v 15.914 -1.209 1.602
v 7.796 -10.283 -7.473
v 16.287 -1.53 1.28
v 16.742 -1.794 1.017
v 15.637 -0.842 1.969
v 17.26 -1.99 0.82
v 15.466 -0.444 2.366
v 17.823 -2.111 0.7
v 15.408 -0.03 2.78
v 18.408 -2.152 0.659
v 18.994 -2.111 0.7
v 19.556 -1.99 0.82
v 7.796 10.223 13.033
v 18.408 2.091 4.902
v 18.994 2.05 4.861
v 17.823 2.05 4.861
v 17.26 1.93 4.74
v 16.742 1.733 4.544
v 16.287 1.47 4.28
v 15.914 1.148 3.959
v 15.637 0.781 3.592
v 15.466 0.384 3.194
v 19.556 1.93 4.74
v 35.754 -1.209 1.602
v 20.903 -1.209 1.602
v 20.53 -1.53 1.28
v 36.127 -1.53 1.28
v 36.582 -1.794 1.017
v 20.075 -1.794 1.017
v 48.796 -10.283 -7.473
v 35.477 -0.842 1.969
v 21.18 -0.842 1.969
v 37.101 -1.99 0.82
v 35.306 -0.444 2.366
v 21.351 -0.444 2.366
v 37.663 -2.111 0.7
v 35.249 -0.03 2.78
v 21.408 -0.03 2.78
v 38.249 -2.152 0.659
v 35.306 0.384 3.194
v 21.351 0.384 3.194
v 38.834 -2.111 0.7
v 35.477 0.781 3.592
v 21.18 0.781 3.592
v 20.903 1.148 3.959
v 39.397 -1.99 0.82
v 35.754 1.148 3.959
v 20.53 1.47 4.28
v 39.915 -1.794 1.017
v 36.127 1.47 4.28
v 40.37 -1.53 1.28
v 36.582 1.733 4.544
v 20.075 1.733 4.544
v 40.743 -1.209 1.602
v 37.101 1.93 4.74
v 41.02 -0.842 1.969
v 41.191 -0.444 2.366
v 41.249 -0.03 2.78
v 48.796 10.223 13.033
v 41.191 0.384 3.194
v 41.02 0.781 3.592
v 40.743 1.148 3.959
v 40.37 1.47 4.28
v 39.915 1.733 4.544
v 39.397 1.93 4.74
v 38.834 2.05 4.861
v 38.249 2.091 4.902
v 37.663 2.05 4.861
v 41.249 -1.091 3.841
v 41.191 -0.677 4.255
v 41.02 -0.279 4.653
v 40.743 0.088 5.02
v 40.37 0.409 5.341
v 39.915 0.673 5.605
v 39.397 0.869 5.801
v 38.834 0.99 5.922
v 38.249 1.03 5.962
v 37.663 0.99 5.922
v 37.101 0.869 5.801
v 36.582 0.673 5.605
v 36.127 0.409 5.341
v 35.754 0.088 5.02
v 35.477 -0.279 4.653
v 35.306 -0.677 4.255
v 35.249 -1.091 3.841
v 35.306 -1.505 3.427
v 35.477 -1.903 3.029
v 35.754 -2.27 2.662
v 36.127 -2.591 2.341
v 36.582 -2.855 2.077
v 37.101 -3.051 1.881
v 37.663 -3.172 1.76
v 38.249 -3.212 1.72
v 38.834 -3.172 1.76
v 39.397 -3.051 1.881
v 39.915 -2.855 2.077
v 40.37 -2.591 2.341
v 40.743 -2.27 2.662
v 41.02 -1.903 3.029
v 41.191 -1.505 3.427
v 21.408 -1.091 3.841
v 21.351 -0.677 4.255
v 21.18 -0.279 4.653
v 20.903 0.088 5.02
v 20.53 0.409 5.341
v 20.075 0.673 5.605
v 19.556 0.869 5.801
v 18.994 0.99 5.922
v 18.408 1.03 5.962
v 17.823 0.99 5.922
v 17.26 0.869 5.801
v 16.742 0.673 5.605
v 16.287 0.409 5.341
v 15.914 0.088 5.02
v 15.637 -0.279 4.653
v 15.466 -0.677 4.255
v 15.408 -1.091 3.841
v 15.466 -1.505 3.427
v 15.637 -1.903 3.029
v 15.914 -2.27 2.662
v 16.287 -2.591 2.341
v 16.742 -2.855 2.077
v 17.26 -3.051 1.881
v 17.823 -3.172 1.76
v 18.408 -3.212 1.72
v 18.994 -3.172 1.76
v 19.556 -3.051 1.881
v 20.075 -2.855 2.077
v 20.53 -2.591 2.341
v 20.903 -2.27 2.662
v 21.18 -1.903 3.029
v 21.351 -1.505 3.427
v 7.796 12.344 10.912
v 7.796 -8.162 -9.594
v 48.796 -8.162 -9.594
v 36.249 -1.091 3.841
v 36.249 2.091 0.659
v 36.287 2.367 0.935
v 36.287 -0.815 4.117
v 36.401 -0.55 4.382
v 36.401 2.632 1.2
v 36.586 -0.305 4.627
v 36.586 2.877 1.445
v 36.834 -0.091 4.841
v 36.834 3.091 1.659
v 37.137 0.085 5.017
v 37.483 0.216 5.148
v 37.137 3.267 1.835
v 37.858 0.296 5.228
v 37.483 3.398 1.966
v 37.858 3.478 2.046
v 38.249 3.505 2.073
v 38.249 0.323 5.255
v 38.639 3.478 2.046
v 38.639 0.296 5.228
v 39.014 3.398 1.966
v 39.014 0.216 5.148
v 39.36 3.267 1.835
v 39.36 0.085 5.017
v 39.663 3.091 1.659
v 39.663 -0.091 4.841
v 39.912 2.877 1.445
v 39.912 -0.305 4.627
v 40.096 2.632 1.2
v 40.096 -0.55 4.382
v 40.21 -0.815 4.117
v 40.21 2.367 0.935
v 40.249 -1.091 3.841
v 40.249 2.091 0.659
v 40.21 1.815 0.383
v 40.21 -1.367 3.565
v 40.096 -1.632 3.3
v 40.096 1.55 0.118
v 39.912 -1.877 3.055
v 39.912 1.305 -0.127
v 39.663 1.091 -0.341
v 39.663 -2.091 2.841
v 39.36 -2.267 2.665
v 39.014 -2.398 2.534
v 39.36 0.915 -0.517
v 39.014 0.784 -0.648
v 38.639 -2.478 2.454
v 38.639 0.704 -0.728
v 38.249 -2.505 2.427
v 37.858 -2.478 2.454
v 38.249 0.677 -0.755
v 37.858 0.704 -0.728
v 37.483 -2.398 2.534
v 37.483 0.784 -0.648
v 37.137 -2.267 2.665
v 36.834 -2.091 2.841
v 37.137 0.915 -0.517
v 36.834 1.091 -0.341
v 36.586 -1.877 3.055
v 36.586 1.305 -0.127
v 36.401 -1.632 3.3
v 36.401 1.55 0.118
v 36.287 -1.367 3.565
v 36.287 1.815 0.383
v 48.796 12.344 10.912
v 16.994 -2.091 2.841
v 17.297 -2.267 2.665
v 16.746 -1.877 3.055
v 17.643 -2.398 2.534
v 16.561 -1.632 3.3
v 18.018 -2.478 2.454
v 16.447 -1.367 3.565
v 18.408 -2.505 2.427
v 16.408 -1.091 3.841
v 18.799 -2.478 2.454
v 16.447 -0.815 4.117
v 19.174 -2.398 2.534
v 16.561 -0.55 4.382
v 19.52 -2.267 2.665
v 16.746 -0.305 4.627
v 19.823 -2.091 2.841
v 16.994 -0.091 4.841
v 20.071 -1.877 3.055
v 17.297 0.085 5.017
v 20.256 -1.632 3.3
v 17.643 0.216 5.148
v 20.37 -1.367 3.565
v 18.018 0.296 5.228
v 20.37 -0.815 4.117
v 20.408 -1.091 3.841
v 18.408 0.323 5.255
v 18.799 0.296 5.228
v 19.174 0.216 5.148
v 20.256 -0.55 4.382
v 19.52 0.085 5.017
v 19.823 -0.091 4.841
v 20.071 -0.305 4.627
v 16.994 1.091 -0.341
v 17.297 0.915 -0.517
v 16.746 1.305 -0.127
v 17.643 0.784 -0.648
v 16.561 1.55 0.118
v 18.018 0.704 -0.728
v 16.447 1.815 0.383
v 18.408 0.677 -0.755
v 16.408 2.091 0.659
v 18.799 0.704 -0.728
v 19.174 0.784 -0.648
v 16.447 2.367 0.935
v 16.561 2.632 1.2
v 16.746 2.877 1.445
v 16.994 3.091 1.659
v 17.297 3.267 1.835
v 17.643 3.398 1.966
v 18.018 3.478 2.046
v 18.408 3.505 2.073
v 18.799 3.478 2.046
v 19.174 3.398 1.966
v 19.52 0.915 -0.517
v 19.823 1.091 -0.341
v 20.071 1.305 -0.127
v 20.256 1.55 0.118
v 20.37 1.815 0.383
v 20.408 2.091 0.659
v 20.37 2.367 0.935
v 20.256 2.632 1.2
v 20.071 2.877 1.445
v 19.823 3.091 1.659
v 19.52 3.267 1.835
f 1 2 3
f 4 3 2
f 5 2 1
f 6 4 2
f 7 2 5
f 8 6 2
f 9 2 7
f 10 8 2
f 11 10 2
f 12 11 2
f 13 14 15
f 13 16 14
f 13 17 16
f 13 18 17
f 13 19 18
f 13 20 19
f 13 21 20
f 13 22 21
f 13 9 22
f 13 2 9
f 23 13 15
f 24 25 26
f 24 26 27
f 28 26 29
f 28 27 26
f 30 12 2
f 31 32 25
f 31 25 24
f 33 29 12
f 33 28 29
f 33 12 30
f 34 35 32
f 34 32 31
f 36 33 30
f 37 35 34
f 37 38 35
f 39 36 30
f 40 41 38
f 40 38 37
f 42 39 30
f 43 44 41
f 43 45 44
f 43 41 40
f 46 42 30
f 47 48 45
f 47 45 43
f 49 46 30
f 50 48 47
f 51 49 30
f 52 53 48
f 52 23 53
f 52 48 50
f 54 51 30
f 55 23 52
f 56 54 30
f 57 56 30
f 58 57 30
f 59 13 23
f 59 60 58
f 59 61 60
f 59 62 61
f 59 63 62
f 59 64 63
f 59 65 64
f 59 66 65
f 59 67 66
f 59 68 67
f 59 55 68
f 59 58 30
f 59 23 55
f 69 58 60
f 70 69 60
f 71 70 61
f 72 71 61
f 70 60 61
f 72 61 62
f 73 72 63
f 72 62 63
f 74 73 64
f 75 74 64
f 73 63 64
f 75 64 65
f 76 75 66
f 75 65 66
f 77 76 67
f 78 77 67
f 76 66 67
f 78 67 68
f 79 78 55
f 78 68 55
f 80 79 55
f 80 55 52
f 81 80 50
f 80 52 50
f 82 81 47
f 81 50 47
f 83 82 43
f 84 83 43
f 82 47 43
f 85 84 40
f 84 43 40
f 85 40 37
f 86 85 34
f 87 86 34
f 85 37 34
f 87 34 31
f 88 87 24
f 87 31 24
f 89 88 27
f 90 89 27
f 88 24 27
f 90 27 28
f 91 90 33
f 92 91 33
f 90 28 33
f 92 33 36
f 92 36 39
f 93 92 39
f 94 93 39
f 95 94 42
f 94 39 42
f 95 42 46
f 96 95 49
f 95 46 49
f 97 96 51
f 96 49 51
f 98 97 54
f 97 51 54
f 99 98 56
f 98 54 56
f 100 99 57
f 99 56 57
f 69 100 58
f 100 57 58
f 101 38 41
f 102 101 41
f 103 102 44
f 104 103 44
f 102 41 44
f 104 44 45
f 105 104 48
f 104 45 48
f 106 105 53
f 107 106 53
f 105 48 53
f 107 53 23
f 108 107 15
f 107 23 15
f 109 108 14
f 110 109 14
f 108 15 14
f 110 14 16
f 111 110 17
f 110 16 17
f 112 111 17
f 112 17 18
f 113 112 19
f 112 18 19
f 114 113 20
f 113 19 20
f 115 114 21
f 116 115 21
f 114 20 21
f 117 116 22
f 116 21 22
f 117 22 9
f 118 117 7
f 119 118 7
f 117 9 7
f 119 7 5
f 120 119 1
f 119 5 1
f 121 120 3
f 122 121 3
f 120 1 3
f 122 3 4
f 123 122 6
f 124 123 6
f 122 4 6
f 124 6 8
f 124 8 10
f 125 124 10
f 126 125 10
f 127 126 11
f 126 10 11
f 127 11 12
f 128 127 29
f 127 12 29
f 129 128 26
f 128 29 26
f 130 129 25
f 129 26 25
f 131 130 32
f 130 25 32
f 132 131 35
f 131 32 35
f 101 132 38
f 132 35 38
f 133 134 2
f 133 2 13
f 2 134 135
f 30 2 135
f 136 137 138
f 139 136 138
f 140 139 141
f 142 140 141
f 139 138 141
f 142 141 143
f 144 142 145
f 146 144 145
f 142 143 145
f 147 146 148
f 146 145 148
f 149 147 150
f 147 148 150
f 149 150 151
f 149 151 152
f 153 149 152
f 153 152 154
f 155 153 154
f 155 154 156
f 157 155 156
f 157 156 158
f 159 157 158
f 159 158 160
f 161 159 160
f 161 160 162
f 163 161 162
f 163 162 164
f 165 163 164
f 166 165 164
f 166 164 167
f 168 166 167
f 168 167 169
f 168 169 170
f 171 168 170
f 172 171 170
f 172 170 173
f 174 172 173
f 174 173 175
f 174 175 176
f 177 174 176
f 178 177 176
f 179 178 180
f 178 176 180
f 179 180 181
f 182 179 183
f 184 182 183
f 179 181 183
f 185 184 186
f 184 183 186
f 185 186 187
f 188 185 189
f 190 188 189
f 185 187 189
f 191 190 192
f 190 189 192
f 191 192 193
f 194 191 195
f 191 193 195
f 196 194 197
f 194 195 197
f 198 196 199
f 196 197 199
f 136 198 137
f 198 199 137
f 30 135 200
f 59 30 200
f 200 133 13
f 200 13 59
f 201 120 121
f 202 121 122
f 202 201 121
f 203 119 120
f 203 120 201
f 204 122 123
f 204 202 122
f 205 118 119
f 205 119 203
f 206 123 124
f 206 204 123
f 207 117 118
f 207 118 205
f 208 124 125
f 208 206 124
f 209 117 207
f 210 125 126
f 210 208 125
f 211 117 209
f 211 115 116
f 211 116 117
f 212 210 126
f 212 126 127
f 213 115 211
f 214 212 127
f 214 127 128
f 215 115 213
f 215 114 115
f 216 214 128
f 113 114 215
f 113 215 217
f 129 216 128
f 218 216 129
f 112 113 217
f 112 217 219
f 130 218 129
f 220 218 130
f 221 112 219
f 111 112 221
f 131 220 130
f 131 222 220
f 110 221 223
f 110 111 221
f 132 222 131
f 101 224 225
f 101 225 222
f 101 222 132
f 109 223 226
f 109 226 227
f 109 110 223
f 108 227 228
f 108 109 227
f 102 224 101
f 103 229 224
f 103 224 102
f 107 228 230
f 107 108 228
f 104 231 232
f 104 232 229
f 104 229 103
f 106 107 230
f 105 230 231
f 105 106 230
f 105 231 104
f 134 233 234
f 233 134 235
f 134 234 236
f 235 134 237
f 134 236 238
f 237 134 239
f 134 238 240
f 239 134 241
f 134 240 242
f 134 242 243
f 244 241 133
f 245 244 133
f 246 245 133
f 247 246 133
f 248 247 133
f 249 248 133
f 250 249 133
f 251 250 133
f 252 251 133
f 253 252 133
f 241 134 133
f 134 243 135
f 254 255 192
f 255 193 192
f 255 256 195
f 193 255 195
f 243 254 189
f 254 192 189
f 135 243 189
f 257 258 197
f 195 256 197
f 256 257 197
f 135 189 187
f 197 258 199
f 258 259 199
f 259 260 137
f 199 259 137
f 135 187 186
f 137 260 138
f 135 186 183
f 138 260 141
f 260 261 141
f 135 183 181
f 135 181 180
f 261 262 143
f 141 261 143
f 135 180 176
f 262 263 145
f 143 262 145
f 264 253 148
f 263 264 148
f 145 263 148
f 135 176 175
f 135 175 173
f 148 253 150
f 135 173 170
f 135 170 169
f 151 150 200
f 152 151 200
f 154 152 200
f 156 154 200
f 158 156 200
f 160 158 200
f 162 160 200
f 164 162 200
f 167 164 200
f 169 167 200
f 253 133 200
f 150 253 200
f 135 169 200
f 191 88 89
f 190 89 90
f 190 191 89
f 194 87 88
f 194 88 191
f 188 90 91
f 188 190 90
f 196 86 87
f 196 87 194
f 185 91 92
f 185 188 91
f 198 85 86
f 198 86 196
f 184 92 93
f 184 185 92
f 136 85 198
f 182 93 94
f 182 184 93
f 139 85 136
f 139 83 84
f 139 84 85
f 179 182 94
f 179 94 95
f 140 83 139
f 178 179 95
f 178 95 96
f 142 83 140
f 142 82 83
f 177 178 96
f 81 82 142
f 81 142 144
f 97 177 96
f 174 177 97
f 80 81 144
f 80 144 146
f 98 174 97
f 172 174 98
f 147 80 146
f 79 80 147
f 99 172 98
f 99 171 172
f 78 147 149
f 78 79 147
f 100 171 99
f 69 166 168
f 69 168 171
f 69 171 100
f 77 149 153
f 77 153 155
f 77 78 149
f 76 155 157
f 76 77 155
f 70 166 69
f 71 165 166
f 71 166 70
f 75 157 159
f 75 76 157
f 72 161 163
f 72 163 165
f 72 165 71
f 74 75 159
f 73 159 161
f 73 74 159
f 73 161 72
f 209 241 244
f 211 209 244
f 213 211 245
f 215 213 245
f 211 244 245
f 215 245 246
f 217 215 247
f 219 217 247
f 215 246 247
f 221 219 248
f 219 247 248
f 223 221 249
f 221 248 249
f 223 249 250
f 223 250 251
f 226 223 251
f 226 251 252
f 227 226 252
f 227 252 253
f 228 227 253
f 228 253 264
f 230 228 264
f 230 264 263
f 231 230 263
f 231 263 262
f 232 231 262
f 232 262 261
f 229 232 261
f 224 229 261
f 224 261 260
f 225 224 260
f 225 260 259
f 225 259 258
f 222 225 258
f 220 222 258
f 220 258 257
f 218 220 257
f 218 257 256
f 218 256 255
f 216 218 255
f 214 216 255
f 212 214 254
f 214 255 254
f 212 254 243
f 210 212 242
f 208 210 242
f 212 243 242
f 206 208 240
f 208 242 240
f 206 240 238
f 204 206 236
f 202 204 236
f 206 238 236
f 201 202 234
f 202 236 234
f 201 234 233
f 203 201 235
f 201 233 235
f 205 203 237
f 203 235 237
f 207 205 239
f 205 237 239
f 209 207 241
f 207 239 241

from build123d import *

# Parameters (mm, degrees)
SKETCH1_W                = 41
SKETCH1_H                = 29
BOSS_EXTRUDE1_DEPTH      = 3
SKETCH11_R               = 3
BOSS_EXTRUDE2_DEPTH      = 1.5
F_4_0_4_DIAMETER_HOLE1_D = 4
BODY_MOVE_COPY9_ANGLE    = 45


with BuildPart() as part:
    # Sketch1 → Boss-Extrude1 (new body)
    with BuildSketch(Plane.XY):
        Rectangle(SKETCH1_W, SKETCH1_H)
    extrude(amount=BOSS_EXTRUDE1_DEPTH)


with BuildPart() as part_1:
    # Body-Move/Copy1: moved
    add(part.part.moved(Location((0.5, 0.5, 0))))

    # Sketch11 → Boss-Extrude2 (add)
    with BuildSketch(Plane.XY.offset(3)):
        with Locations((-9.387244392, 0.5)):
            Circle(SKETCH11_R)
        with Locations((10.452938647, 0.5)):
            Circle(SKETCH11_R)
    extrude(amount=BOSS_EXTRUDE2_DEPTH)

    # Ø4.0 (4) Diameter Hole1 (through all)
    with Locations(Plane.XY.offset(4.5)):
        with Locations((-9.387244392, 0.5), (10.452938647, 0.5)):
            Hole(F_4_0_4_DIAMETER_HOLE1_D / 2)


with BuildPart() as part_2:
    # Body-Move/Copy8: moved
    add(part_1.part.moved(Location((27.795693281, 0, 0))))


with BuildPart() as part_3:
    # Body-Move/Copy9: moved
    add(part_2.part.rotate(Axis((0, 0.5, 2.25), (1, 0, 0)), BODY_MOVE_COPY9_ANGLE))


solid = part_3.part
